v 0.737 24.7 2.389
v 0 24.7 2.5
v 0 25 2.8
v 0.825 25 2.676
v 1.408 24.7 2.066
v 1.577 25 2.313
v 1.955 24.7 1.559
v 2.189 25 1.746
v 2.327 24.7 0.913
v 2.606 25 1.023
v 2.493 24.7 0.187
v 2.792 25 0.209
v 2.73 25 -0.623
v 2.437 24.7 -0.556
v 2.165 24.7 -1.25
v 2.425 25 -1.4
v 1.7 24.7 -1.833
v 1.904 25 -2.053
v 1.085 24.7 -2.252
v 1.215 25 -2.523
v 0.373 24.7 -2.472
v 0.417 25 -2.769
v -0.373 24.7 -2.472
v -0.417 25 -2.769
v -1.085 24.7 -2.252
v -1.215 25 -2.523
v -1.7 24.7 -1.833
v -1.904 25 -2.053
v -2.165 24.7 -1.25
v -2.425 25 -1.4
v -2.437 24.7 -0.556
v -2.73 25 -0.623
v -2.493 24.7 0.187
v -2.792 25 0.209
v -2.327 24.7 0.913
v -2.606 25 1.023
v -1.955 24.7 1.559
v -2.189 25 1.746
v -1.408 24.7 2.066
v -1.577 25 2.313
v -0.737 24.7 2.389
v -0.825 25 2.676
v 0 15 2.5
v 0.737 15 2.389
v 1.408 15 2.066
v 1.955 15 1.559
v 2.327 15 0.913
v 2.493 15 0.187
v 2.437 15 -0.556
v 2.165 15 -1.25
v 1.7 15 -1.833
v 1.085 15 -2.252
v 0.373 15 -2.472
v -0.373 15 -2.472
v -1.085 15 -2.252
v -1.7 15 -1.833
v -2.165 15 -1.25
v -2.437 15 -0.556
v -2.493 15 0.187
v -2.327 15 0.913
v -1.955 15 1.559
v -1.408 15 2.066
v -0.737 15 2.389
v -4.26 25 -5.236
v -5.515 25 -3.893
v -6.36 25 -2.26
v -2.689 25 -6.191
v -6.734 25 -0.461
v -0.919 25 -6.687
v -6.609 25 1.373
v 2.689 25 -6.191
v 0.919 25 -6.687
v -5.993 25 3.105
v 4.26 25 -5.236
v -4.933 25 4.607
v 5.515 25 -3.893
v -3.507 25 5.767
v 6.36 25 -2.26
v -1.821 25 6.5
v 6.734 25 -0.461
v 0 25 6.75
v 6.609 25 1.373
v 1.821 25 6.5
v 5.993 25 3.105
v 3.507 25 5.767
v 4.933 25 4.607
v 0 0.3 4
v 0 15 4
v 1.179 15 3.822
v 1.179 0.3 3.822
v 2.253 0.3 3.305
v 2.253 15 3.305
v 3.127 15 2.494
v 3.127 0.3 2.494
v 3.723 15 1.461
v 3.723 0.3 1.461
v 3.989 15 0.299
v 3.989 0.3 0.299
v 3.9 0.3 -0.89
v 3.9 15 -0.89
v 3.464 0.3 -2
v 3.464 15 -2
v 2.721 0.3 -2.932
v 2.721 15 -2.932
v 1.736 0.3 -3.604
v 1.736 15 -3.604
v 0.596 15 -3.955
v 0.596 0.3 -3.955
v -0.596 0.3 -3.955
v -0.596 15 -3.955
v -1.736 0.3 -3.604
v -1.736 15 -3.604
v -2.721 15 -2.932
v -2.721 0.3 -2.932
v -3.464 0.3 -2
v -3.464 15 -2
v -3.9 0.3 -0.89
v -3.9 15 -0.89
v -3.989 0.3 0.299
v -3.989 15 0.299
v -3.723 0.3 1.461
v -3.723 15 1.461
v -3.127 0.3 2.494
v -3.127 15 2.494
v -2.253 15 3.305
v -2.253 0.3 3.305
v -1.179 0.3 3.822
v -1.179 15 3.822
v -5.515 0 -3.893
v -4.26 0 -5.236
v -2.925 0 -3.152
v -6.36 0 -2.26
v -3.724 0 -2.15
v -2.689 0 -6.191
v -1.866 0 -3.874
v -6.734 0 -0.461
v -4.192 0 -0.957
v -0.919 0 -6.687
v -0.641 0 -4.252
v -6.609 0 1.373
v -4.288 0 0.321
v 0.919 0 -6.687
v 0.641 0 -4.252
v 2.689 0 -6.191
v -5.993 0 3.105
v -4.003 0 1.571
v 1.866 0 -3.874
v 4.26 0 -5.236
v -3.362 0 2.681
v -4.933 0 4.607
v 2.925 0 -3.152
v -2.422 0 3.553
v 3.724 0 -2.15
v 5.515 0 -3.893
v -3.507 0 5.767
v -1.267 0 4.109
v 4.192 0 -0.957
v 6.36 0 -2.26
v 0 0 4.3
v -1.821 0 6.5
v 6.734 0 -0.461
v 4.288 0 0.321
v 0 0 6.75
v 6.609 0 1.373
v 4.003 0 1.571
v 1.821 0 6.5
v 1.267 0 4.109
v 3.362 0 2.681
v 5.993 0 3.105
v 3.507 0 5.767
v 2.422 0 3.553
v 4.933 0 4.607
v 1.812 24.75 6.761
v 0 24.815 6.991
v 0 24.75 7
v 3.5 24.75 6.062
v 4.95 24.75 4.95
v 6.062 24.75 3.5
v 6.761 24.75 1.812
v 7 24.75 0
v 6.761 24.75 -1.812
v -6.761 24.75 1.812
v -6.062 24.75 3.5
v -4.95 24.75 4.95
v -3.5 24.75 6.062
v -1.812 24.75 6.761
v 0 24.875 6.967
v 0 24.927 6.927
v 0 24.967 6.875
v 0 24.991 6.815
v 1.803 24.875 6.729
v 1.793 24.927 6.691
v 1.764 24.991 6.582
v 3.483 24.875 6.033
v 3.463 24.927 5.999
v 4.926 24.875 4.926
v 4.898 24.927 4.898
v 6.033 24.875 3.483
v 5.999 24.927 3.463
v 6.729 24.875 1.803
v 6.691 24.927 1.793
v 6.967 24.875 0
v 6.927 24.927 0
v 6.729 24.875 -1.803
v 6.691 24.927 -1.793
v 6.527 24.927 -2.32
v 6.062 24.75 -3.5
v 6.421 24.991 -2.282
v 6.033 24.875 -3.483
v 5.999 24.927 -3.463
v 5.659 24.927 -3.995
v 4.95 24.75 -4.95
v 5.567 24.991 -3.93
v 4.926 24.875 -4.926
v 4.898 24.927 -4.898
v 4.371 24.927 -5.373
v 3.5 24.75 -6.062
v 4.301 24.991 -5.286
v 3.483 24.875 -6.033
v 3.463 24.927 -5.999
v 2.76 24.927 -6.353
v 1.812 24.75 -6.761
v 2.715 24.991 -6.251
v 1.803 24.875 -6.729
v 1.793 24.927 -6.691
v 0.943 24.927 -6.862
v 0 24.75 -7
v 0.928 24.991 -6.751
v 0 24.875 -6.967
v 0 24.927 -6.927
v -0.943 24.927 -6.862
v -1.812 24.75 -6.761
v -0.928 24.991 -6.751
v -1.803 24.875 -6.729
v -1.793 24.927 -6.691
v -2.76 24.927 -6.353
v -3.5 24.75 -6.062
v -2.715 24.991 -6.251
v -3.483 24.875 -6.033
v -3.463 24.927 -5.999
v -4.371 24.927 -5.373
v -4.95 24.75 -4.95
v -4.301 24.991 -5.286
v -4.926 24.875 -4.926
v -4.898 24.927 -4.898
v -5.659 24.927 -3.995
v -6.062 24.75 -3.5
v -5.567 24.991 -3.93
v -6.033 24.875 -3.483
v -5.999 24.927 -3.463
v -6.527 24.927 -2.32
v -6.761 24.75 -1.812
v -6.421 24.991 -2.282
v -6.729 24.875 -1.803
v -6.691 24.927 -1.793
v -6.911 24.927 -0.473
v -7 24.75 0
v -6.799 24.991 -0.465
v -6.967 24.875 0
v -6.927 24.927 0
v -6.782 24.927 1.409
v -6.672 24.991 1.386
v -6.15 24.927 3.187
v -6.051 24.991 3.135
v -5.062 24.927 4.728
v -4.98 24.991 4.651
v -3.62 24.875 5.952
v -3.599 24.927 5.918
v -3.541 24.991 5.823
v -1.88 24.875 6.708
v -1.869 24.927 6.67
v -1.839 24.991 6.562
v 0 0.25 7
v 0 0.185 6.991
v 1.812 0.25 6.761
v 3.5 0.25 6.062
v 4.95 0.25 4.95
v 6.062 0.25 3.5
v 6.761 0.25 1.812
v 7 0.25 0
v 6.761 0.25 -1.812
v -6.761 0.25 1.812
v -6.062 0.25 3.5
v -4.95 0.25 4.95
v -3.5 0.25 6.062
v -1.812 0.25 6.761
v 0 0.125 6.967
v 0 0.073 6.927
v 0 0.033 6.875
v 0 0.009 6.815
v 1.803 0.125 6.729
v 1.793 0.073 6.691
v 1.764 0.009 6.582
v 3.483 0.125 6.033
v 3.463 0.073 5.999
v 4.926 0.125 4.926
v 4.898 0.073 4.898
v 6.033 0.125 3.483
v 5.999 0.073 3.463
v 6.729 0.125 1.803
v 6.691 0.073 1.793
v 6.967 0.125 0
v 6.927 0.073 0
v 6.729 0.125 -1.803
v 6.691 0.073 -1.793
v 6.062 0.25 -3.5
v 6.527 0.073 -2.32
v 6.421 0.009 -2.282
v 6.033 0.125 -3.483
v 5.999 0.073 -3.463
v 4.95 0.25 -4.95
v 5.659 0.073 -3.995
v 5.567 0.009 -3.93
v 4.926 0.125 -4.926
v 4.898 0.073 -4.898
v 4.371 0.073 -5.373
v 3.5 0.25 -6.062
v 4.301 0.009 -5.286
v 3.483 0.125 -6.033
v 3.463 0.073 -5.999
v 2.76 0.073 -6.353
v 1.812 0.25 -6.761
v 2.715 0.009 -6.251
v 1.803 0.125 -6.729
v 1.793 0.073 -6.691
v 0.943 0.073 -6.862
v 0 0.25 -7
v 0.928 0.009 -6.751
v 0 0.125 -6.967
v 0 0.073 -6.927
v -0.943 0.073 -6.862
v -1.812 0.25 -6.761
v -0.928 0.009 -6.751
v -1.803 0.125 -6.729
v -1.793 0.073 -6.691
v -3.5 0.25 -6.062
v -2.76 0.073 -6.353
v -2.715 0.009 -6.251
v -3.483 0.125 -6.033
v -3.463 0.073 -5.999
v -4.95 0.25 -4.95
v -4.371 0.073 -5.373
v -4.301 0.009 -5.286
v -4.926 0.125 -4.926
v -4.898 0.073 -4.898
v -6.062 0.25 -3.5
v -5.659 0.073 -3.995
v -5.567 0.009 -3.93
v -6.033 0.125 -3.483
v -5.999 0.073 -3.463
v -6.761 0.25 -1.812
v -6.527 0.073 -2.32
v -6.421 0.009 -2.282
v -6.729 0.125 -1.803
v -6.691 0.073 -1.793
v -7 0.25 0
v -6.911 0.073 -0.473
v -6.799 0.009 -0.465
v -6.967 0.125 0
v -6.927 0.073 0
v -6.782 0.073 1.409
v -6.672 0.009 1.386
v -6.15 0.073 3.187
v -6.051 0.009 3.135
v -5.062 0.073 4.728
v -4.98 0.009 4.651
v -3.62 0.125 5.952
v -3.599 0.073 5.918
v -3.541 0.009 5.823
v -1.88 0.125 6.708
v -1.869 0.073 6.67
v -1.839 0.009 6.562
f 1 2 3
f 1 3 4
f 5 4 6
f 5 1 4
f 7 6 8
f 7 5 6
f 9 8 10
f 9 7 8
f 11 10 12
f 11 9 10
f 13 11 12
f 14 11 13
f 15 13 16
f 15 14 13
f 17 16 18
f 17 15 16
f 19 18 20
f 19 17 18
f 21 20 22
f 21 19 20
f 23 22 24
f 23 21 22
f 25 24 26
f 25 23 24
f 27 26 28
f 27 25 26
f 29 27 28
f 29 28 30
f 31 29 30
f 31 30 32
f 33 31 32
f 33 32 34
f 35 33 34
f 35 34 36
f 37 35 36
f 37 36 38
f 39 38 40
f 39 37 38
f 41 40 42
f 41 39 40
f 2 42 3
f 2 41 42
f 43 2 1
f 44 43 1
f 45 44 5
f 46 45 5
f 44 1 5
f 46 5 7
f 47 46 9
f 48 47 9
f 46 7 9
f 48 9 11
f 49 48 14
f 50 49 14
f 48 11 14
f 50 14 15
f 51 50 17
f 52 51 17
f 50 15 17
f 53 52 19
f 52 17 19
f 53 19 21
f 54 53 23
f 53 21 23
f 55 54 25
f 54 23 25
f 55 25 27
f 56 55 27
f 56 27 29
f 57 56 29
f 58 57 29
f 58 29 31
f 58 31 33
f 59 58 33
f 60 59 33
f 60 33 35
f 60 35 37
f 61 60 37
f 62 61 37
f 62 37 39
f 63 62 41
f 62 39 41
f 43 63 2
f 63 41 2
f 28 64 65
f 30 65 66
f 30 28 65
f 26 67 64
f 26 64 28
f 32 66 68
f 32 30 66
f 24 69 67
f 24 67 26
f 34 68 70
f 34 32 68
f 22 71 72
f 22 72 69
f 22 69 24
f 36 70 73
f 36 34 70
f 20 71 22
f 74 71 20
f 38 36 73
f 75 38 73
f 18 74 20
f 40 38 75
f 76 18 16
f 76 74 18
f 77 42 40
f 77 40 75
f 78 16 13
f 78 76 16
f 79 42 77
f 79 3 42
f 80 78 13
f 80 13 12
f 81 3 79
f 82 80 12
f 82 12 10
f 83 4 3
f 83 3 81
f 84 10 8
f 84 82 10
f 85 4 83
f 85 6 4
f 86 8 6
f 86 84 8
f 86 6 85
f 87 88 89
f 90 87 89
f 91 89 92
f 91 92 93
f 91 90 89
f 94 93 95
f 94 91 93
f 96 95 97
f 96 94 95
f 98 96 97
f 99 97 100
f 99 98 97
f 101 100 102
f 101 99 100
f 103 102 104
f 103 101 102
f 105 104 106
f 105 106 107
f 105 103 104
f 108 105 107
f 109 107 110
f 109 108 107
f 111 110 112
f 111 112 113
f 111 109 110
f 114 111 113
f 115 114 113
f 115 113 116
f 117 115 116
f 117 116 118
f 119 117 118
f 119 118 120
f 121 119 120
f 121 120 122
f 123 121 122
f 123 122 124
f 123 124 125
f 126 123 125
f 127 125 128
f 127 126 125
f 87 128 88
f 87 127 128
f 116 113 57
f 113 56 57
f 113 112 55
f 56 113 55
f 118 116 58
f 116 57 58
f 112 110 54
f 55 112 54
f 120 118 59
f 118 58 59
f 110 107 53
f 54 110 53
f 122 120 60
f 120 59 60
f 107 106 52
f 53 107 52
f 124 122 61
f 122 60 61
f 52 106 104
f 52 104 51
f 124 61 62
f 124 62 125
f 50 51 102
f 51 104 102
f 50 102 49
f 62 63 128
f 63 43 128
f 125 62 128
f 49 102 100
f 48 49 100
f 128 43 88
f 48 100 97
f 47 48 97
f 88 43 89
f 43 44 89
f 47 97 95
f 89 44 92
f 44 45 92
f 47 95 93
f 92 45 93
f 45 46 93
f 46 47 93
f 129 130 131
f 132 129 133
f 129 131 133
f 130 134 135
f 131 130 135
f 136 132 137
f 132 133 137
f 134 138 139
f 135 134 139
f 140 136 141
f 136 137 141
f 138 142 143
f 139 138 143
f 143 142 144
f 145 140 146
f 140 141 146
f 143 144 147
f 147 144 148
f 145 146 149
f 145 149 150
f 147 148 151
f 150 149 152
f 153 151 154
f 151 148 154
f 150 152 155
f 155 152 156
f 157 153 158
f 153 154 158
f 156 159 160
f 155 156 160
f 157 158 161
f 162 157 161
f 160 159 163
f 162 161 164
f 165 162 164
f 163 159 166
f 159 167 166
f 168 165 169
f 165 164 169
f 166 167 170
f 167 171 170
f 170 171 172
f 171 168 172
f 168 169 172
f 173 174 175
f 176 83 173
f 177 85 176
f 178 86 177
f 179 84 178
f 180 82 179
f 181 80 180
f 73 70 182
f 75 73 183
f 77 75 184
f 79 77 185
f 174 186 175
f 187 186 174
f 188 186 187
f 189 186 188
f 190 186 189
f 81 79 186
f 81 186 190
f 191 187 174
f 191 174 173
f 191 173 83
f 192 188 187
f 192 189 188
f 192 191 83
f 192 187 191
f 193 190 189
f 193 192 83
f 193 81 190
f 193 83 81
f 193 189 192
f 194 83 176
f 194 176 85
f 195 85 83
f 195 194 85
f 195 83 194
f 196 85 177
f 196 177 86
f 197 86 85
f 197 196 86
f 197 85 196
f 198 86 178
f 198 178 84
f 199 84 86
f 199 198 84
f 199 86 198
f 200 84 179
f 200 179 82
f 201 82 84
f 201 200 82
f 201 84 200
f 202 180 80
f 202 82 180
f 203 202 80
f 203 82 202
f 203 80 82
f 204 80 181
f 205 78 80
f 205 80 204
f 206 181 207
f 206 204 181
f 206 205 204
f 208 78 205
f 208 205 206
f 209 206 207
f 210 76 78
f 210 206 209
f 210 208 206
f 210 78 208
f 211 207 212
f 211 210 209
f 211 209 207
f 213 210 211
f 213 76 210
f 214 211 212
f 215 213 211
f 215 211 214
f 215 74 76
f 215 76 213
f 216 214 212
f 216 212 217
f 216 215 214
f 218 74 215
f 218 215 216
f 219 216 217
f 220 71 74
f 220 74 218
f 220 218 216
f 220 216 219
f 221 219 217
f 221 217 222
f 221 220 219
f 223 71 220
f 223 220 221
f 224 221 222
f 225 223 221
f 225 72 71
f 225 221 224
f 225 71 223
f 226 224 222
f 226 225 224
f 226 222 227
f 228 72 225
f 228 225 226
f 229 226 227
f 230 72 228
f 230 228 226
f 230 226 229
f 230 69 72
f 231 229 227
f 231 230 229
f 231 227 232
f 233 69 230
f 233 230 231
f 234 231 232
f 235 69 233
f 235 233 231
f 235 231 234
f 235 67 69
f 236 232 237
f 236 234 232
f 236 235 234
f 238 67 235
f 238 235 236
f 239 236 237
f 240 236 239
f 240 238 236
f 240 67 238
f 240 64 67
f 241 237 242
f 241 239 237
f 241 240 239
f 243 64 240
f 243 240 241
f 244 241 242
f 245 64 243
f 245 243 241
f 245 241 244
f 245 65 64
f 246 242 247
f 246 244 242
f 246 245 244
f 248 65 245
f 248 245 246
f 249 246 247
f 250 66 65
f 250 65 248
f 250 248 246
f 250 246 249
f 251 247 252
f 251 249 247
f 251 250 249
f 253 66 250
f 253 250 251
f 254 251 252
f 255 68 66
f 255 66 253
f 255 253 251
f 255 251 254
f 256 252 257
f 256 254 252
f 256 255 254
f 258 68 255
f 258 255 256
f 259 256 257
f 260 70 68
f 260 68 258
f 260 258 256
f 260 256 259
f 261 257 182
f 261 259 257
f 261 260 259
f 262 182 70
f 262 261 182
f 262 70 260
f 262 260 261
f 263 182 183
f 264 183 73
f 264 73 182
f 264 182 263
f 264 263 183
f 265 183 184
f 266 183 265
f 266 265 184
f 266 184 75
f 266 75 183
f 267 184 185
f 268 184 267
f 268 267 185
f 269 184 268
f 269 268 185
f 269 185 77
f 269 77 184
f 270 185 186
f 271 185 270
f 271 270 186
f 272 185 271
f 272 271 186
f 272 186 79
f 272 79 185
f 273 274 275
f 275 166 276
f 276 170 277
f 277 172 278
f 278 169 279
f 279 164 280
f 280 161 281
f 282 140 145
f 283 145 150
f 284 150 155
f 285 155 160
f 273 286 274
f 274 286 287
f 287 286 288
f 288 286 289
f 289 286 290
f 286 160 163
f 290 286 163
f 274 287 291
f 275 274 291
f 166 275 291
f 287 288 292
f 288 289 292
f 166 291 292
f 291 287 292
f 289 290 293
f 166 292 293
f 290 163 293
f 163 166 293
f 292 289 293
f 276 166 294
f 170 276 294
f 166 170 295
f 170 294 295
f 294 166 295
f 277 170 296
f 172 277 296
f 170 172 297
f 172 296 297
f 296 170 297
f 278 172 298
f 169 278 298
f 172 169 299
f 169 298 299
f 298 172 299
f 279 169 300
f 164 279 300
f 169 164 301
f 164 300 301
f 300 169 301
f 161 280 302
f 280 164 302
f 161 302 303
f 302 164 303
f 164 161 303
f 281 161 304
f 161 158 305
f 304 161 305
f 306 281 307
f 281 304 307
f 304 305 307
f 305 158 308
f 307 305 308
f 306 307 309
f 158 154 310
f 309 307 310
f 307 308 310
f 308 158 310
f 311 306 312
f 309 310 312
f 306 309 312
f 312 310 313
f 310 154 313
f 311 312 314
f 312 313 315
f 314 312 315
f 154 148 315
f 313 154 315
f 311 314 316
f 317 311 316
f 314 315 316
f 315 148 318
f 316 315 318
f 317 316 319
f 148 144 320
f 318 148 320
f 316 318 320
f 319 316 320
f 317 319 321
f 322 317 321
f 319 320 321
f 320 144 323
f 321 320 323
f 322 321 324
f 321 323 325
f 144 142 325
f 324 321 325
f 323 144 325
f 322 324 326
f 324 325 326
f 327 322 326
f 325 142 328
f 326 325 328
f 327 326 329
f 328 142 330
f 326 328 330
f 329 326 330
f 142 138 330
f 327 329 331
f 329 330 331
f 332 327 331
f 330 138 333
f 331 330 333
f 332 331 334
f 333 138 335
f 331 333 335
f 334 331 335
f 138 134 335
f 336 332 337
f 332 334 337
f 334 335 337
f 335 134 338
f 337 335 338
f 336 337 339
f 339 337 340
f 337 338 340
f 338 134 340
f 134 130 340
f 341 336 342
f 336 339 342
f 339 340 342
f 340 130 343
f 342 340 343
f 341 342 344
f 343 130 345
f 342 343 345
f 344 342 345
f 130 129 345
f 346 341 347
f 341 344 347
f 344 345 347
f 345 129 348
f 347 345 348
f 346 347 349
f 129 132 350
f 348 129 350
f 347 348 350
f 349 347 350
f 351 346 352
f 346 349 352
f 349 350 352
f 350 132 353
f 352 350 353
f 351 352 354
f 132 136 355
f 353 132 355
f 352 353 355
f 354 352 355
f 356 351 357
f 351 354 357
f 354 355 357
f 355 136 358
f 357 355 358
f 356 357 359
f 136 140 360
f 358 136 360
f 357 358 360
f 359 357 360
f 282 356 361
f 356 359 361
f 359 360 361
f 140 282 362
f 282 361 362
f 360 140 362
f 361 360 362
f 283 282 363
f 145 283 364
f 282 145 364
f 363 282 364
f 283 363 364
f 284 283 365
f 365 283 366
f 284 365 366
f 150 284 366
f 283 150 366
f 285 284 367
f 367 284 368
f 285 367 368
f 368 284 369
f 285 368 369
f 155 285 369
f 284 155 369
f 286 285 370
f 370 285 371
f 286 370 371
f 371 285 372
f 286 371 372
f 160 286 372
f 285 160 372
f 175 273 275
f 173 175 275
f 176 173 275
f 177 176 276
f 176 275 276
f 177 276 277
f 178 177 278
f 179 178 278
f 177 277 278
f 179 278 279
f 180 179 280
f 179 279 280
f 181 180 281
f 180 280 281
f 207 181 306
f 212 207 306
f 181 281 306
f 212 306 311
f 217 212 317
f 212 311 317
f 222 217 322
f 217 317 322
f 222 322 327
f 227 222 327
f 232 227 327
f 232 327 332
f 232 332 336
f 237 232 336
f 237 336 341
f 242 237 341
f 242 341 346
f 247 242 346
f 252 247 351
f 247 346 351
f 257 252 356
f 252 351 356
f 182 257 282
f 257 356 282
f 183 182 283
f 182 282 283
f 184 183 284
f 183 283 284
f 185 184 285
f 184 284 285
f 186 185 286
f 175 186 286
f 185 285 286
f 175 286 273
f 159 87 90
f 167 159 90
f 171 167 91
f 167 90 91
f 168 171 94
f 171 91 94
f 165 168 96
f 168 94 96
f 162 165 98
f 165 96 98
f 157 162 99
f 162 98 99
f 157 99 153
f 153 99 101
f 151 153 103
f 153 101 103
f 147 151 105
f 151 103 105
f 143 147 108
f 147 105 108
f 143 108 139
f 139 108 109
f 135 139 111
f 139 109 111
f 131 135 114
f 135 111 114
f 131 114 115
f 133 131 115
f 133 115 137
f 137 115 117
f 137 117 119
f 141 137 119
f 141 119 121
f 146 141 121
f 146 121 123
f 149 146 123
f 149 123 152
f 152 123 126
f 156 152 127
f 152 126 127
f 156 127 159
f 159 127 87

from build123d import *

# Parameters (mm, degrees)
SKETCH_1_R          = 7
EXTRUDE_1_DEPTH     = 25
CUT_EXTRUDE_START   = 25
SKETCH_2_R          = 2.5
CUT_EXTRUDE_1_DEPTH = 10
SKETCH_3_R          = 4
CUT_EXTRUDE_2_DEPTH = 15
FILLET_1_R          = 0.25
CHAMFER_1_SIZE      = 0.3


with BuildPart() as part:
    # 草图1 → 凸台-拉伸1 (new body)
    with BuildSketch(Plane(origin=(0, 0, 0), x_dir=(1, 0, 0), z_dir=(0, 1, 0))):
        with Locations(Location((0, 0, 0), (0, 0, 270))):
            Circle(SKETCH_1_R)
    extrude(amount=EXTRUDE_1_DEPTH)

    # 草图2 → 切除-拉伸1 (cut)
    with BuildSketch(Plane(origin=(0, 0, 0), x_dir=(1, 0, 0), z_dir=(0, 1, 0)).offset(CUT_EXTRUDE_START)):
        with Locations(Location((0, 0, 0), (0, 0, 270))):
            Circle(SKETCH_2_R)
    extrude(amount=-CUT_EXTRUDE_1_DEPTH, mode=Mode.SUBTRACT)

    # 草图3 → 切除-拉伸2 (cut)
    with BuildSketch(Plane(origin=(0, 0, 0), x_dir=(1, 0, 0), z_dir=(0, 1, 0))):
        with Locations(Location((0, 0, 0), (0, 0, 270))):
            Circle(SKETCH_3_R)
    extrude(amount=CUT_EXTRUDE_2_DEPTH, mode=Mode.SUBTRACT)

    # 圆角1
    fillet_1_edges = [part.edges().sort_by_distance(p)[0] for p in [
        (0, 0, -7),
        (0, 25, -7),
    ]]
    fillet(fillet_1_edges, radius=FILLET_1_R)

    # 倒角1
    chamfer_1_edges = [part.edges().sort_by_distance(p)[0] for p in [
        (0, 0, -4),
        (0, 25, -2.5),
    ]]
    chamfer(chamfer_1_edges, length=CHAMFER_1_SIZE)


solid = part.part
